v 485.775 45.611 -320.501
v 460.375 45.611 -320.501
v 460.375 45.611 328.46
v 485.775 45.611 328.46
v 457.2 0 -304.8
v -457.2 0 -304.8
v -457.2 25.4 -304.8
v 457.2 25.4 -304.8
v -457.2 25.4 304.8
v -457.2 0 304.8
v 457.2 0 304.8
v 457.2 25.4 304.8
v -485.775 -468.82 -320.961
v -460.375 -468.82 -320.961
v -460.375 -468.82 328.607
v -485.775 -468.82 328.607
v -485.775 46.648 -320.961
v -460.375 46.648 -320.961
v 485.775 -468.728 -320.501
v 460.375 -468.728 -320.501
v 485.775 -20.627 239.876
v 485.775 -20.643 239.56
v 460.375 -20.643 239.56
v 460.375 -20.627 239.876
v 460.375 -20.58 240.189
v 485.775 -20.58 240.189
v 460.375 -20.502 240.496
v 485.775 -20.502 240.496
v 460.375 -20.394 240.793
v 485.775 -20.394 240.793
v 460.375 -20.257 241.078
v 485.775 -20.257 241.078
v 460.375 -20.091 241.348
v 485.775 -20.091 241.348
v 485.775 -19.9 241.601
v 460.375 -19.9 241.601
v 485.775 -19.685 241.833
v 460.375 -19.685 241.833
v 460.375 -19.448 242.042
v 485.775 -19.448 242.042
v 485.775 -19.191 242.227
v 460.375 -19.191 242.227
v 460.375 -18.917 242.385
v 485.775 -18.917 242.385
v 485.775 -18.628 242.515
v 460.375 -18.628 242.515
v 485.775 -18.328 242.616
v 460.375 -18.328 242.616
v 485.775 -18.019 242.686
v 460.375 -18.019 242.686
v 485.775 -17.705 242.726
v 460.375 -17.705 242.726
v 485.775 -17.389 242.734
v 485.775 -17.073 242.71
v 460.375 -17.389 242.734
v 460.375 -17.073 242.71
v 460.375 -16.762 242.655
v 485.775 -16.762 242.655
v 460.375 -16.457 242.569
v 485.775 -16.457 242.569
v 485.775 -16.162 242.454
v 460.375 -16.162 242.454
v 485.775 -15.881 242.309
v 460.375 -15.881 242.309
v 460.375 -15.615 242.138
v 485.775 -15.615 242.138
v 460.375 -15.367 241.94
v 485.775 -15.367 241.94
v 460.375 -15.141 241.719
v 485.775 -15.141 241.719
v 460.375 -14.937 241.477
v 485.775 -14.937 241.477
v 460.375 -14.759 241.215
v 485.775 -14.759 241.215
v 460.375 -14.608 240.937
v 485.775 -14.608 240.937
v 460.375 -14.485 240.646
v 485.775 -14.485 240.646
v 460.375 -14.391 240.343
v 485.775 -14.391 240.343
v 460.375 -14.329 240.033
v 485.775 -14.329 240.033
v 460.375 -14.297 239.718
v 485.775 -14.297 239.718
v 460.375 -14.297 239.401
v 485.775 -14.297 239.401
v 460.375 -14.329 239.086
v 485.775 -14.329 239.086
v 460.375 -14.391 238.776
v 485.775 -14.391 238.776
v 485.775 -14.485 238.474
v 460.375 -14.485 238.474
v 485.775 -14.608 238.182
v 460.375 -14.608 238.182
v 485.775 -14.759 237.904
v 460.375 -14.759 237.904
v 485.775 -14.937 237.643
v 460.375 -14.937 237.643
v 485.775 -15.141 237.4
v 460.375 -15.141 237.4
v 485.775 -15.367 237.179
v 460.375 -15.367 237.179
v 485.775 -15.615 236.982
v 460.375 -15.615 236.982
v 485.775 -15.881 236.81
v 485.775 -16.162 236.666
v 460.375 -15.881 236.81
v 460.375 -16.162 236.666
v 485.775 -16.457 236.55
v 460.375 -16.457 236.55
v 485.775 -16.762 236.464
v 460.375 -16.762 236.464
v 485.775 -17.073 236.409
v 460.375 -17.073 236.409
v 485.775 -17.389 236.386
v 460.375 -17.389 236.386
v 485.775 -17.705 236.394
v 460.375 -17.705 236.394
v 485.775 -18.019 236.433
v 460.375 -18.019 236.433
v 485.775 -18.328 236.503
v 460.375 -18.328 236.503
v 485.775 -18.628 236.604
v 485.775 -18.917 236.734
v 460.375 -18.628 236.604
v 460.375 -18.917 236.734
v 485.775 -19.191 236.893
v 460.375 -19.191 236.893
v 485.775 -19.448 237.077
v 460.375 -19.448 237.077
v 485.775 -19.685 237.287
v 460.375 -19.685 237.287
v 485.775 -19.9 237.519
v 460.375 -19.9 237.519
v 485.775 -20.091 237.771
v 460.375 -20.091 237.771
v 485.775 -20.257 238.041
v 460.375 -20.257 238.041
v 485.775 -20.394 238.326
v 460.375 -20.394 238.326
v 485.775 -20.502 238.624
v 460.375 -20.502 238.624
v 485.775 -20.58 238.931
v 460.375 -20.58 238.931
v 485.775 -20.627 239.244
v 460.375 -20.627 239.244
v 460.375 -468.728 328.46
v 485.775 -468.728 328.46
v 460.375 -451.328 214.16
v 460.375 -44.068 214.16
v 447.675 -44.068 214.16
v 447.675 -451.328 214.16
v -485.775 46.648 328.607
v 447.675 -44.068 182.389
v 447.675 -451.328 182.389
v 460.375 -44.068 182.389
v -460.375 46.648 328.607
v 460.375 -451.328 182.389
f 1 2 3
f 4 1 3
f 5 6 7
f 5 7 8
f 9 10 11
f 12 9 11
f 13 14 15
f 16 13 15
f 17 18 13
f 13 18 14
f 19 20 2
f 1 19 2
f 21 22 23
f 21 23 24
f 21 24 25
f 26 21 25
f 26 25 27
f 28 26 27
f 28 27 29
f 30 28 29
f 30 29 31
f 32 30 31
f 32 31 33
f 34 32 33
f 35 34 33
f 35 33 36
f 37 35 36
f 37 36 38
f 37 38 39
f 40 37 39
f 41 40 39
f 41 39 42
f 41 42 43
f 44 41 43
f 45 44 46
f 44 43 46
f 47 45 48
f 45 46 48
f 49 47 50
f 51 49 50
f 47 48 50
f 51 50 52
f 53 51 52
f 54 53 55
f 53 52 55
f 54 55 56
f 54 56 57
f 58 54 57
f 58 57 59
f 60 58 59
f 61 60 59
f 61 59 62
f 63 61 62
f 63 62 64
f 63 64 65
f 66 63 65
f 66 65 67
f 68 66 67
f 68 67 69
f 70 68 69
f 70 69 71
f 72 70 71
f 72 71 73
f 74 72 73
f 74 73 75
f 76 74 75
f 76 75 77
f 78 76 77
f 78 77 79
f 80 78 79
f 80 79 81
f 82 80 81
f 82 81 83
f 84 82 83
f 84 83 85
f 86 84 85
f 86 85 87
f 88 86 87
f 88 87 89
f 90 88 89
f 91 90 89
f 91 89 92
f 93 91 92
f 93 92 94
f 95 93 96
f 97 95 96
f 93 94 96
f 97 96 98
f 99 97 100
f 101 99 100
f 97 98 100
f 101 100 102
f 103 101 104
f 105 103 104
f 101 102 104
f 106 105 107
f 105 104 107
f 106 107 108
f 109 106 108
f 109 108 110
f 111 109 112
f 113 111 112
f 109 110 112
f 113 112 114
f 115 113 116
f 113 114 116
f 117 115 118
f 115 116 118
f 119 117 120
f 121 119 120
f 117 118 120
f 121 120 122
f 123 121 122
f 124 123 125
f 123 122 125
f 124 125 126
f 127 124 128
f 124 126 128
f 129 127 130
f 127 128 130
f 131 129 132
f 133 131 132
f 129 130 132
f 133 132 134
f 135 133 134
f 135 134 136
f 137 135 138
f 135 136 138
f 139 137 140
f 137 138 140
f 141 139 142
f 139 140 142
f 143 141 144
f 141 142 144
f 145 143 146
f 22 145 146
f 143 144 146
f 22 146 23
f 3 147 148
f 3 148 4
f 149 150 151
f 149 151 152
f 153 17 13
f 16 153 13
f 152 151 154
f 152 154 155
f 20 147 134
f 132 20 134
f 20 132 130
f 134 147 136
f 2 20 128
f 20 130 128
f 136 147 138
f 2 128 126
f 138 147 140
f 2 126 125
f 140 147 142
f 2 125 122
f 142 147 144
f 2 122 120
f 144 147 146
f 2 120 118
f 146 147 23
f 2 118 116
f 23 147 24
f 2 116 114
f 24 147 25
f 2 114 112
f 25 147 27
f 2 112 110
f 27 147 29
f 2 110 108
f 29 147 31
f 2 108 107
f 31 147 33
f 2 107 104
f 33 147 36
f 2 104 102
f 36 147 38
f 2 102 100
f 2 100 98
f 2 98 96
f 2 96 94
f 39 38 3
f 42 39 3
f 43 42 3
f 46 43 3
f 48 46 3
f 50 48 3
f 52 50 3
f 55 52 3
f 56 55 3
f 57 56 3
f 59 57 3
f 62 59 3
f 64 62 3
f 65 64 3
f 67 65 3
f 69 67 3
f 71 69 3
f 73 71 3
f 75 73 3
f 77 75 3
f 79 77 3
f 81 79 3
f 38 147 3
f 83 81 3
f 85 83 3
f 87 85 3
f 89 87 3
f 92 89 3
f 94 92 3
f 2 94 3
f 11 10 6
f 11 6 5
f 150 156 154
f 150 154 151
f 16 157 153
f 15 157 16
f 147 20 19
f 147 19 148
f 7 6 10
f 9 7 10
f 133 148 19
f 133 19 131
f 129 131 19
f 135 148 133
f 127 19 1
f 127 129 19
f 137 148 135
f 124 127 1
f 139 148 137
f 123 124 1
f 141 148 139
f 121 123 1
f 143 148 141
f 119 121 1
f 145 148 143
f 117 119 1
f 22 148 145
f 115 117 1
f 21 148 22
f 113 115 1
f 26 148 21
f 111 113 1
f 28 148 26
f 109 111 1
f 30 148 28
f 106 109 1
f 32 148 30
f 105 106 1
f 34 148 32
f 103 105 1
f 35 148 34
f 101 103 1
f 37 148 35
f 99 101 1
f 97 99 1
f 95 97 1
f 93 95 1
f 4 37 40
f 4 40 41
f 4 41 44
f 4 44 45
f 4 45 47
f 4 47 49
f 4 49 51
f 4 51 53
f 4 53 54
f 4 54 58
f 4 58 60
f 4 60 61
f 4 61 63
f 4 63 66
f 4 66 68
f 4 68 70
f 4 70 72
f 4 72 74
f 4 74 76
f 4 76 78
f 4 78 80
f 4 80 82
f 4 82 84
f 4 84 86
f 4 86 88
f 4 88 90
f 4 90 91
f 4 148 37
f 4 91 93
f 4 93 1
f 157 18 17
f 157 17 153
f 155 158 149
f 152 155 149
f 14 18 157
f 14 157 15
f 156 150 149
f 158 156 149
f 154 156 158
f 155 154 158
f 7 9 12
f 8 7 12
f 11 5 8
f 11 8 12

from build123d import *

# Parameters (mm, degrees)
F0_W     = 914.4
F0_H     = 609.6
F1_DEPTH = 25.4
F3_START = 3.175
F2_W     = 514.3393576145
F2_H     = 648.9602029324
F3_DEPTH = 25.4
F5_START = 3.175
F4_W     = 515.4682397842
F4_H     = 649.567514658
F5_DEPTH = 25.4
F6_R     = 3.175
F7_DEPTH = 25.401
F8_W     = 407.2593894481
F8_H     = 31.7710586576
F9_DEPTH = 12.7


with BuildPart() as f1:
    # F0 (on Front) → F1 (new body)
    with BuildSketch(Plane.XZ):
        Rectangle(F0_W, F0_H)
    extrude(amount=-F1_DEPTH)


with BuildPart() as f3:
    # F2 (on face) → F3 (new body)
    with BuildSketch(Plane.YZ.offset(457.2).offset(F3_START)):
        with Locations((-211.5584760904, 3.9795786142)):
            Rectangle(F2_W, F2_H)
    extrude(amount=F3_DEPTH)

    # F6 (on face) → F7 (cut, through all)
    with BuildSketch(Plane(origin=(460.375, 0, 0), x_dir=(0, -1, 0), z_dir=(-1, 0, 0))):
        with Locations((17.4681488425, 239.5596800804)):
            Circle(F6_R)
    extrude(amount=-F7_DEPTH, mode=Mode.SUBTRACT)


with BuildPart() as f5:
    # F4 (on face) → F5 (new body)
    with BuildSketch(Plane(origin=(-457.2, 0, 0), x_dir=(0, -1, 0), z_dir=(-1, 0, 0)).offset(F5_START)):
        with Locations((211.0857069492, 3.8228482008)):
            Rectangle(F4_W, F4_H)
    extrude(amount=F5_DEPTH)


with BuildPart() as f9:
    # F8 (on face) → F9 (new body)
    with BuildSketch(Plane(origin=(460.375, 0, 0), x_dir=(0, -1, 0), z_dir=(-1, 0, 0))):
        with Locations((247.6981936488, 198.2741507516)):
            Rectangle(F8_W, F8_H)
    extrude(amount=F9_DEPTH)


solid = Compound([f1.part, f3.part, f5.part, f9.part])
